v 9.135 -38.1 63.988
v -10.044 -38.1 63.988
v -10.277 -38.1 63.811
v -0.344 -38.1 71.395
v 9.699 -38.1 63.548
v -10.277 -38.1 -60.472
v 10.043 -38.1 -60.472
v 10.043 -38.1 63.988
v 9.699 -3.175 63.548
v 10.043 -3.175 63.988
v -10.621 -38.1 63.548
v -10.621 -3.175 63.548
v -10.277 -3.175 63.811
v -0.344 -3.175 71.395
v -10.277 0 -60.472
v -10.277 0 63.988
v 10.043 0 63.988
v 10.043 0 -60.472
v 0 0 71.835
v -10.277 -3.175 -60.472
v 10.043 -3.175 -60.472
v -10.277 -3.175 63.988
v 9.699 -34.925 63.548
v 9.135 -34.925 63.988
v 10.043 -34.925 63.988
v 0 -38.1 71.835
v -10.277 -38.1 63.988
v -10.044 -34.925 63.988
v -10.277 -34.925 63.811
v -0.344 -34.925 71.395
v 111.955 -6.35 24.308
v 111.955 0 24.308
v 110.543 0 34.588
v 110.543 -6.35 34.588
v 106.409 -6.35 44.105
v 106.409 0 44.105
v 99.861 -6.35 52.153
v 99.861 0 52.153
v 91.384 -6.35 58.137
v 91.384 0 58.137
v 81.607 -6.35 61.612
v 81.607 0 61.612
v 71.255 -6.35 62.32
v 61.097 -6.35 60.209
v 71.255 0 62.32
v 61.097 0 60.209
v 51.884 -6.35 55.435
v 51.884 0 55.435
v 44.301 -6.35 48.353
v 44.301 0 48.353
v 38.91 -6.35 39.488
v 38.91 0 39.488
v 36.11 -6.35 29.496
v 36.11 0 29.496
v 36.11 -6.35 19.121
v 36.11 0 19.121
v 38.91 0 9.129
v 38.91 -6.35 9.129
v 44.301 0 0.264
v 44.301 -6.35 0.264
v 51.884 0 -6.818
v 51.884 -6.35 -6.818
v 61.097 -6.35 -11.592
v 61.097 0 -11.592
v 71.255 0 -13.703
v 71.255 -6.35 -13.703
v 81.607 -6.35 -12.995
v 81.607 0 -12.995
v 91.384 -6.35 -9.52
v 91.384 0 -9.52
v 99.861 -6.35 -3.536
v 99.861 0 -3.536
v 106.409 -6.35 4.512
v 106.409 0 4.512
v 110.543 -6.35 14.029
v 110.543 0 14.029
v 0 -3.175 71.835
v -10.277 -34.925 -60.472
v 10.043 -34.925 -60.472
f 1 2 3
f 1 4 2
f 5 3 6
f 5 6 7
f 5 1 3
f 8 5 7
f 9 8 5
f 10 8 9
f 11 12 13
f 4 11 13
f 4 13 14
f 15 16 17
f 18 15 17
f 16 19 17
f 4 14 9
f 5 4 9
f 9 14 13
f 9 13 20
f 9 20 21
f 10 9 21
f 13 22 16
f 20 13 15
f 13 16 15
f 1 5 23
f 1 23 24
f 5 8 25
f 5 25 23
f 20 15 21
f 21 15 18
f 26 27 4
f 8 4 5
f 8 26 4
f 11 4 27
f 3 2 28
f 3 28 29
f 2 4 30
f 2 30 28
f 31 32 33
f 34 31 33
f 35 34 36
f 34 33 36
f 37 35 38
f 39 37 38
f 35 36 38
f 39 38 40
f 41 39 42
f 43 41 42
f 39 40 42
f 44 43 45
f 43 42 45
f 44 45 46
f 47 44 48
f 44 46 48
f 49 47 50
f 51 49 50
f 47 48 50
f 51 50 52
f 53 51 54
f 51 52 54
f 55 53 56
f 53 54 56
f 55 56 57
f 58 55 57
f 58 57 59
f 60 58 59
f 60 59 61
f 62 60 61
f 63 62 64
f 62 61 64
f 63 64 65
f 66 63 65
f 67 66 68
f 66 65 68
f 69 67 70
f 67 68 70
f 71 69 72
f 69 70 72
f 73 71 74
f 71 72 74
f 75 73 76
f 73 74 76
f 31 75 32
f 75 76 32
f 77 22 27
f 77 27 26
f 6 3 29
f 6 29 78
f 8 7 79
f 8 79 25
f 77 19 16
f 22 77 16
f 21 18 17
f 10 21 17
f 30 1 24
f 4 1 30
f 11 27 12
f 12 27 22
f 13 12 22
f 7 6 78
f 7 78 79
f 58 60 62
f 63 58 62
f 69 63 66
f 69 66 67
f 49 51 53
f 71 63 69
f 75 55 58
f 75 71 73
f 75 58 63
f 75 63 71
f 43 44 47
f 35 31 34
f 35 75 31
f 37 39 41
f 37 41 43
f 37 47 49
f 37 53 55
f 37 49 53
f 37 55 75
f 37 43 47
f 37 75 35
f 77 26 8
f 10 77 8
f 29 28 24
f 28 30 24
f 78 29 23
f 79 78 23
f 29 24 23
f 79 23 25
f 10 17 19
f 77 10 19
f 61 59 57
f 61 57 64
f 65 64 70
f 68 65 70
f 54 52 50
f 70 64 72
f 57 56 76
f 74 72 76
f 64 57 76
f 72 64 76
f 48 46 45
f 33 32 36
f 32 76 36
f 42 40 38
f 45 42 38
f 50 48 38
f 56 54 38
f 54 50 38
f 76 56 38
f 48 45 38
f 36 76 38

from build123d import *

# Parameters (mm, degrees)
F1_DEPTH = 3.175
F2_W     = 12.7448869769
F2_H     = 34.925
F3_W     = 12.930203917
F3_H     = 34.925
F4_DEPTH = 0.5588
F6_DEPTH = 3.175
F7_R     = 38.1
F8_DEPTH = 6.35


with BuildPart() as f1:
    # F0 (on Front) → F1 (new body)
    with BuildSketch(Plane.XZ):
        Polygon((-10.2770774922, 63.9884688905), (-10.2770774922, -60.4715311095), (10.0429225078, -60.4715311095), (10.0429225078, 63.9884688905), (0, 71.8352422118), align=None)
    extrude(amount=F1_DEPTH)

    # F2 (on face) + F3 (on face) → F4 (join)
    with BuildSketch(Plane(origin=(34.8511250209, 0, 44.6052324395), x_dir=(0.7879962, 0, -0.6156801026), z_dir=(0.6156801026, 0, 0.7879962))):
        with Locations((-37.8550858053, -20.6375)):
            Rectangle(F2_W, F2_H)
    with BuildSketch(Plane(origin=(-34.6487483252, 0, 45.380165447), x_dir=(0.7948117105, 0, 0.6068561155), z_dir=(-0.6068561155, 0, 0.7948117105))):
        with Locations((37.1285540838, -20.6375)):
            Rectangle(F3_W, F3_H)
    extrude(amount=-F4_DEPTH, dir=(0.6156801026, 0, 0.7879962))


with BuildPart() as f6:
    # F5 (on face) → F6 (new body)
    with BuildSketch(Plane.XZ.offset(38.1)):
        Polygon((9.1353083139, 63.9884688905), (-10.0444074579, 63.9884688905), (-10.2770774922, 63.8108202332), (-10.2770774922, -60.4715311095), (10.0429225078, -60.4715311095), (10.0429225078, 63.9884688905), (9.6988804665, 63.5481366139), align=None)
        Polygon((-0.3440420413, 71.3949099352), (-10.0444074579, 63.9884688905), (9.1353083139, 63.9884688905), align=None)
    extrude(amount=-F6_DEPTH)


with BuildPart() as f8:
    # F7 (on Front) → F8 (new body)
    with BuildSketch(Plane.XZ):
        with Locations((73.8554428822, 24.3084832607)):
            Circle(F7_R)
    extrude(amount=F8_DEPTH)


solid = Compound([f1.part, f6.part, f8.part])
